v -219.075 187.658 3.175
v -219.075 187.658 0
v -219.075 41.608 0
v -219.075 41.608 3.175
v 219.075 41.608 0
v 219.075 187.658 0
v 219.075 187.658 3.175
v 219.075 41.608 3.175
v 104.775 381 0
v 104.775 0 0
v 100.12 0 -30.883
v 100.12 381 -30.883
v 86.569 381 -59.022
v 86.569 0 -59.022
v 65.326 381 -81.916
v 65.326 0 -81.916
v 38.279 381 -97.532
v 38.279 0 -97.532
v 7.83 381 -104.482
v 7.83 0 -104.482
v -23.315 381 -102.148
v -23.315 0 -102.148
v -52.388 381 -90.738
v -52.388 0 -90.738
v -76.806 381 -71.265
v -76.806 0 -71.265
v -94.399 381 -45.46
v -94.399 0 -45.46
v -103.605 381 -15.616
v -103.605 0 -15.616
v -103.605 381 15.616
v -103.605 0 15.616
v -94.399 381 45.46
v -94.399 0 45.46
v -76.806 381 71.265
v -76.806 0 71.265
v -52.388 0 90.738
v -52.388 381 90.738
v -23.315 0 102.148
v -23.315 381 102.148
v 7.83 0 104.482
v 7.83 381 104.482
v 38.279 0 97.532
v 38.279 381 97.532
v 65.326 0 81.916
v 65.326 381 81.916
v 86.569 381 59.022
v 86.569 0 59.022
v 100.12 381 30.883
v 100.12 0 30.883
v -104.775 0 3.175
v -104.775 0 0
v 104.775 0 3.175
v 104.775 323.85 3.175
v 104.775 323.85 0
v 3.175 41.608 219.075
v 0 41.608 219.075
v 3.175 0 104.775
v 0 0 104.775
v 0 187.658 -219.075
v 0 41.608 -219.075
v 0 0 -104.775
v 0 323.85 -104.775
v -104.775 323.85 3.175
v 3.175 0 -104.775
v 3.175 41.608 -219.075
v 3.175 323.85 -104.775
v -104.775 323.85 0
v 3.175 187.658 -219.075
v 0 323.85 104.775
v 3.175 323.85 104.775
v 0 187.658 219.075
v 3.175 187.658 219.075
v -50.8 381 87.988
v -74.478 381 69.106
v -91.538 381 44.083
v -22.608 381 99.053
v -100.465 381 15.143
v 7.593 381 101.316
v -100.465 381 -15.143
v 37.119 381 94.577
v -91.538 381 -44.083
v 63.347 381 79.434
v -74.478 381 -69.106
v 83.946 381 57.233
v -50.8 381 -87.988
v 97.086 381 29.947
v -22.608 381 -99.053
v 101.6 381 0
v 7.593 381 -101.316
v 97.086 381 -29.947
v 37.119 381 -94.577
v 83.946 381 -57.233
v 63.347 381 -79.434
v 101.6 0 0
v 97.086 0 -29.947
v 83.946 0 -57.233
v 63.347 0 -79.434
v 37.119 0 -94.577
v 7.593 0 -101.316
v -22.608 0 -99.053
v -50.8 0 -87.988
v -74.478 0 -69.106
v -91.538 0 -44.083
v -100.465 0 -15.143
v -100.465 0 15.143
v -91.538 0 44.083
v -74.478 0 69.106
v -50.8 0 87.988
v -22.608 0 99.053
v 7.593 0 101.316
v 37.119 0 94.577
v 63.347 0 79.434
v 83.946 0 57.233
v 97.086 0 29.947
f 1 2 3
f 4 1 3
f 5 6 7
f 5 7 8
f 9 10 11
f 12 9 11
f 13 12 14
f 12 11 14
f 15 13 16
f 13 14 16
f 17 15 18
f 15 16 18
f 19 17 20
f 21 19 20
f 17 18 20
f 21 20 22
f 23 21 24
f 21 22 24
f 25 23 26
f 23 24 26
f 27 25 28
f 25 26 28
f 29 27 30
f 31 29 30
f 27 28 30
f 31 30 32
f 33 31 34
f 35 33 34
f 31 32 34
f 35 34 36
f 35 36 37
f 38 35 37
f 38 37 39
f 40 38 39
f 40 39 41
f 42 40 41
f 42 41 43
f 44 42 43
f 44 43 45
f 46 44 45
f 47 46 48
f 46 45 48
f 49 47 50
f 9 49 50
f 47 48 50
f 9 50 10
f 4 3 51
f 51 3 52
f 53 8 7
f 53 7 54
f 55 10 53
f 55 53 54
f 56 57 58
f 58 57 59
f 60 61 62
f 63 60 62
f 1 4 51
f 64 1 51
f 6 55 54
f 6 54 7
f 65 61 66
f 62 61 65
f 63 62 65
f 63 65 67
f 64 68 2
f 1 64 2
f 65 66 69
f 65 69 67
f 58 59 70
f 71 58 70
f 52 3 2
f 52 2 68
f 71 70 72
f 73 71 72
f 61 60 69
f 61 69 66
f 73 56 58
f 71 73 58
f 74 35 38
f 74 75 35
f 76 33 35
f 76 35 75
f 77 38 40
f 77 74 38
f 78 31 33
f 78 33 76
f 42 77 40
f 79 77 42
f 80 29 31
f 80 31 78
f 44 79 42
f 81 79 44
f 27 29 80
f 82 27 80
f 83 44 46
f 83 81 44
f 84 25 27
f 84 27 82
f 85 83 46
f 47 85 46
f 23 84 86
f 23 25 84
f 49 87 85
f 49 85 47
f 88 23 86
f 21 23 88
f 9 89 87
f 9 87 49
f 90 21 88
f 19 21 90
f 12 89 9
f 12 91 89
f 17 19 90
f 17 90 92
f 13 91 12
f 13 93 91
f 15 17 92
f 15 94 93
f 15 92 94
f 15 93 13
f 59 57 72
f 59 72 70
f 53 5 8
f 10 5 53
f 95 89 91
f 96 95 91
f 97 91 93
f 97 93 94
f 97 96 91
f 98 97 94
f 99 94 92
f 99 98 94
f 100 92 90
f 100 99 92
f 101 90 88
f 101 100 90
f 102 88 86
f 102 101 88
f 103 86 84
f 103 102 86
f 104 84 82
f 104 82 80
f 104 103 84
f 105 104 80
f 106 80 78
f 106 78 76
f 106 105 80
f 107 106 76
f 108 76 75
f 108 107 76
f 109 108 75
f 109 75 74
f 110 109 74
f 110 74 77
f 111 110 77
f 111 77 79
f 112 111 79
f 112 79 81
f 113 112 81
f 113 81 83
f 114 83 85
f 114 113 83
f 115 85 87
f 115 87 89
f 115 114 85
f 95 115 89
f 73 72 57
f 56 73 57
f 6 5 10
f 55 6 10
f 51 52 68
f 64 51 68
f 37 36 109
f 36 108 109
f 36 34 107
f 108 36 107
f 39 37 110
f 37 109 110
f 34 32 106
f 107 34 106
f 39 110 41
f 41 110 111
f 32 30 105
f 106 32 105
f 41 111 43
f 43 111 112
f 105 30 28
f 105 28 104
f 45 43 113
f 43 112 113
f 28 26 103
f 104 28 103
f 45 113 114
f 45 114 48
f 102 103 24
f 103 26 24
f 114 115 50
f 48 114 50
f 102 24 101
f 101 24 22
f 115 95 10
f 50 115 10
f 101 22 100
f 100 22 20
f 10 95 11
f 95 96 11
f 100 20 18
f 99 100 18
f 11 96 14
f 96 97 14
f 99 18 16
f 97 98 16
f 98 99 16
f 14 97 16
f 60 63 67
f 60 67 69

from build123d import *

# Parameters (mm, degrees)
SKETCH1_R           = 104.775
SKETCH1_R_2         = 101.6
BOSS_EXTRUDE1_DEPTH = 381
BOSS_EXTRUDE2_DEPTH = 3.175
BOSS_EXTRUDE3_DEPTH = 3.175
BOSS_EXTRUDE4_DEPTH = 3.175
BOSS_EXTRUDE5_DEPTH = 3.175


with BuildPart() as part:
    # Sketch1 → Boss-Extrude1 (new body)
    with BuildSketch(Plane(origin=(0, 0, 0), x_dir=(1, 0, 0), z_dir=(0, 1, 0))):
        Circle(SKETCH1_R)
        Circle(SKETCH1_R_2, mode=Mode.SUBTRACT)
    extrude(amount=BOSS_EXTRUDE1_DEPTH)


with BuildPart() as body_2:
    # Sketch2 → Boss-Extrude2 (new body)
    with BuildSketch(Plane(origin=(0, 0, 0), x_dir=(0, 0, -1), z_dir=(1, 0, 0))):
        Polygon((-104.775, 323.85), (-219.075, 187.657672757), (-219.075, 41.607672757), (-104.775, 0), align=None)
    extrude(amount=BOSS_EXTRUDE2_DEPTH)


with BuildPart() as body_3:
    # Sketch5 → Boss-Extrude3 (new body)
    with BuildSketch(Plane(origin=(0, 0, 0), x_dir=(0, 0, -1), z_dir=(1, 0, 0))):
        Polygon((104.775, 323.85), (219.075, 187.657672757), (219.075, 41.607672757), (104.775, 0), align=None)
    extrude(amount=BOSS_EXTRUDE3_DEPTH)


with BuildPart() as body_4:
    # Sketch6 → Boss-Extrude4 (new body)
    with BuildSketch(Plane.XY):
        Polygon((-104.775, 323.85), (-219.075, 187.657672757), (-219.075, 41.607672757), (-104.775, 0), align=None)
    extrude(amount=BOSS_EXTRUDE4_DEPTH)


with BuildPart() as body_5:
    # Sketch7 → Boss-Extrude5 (new body)
    with BuildSketch(Plane.XY):
        Polygon((104.775, 323.85), (219.075, 187.657672757), (219.075, 41.607672757), (104.775, 0), align=None)
    extrude(amount=BOSS_EXTRUDE5_DEPTH)


solid = Compound([part.part, body_2.part, body_3.part, body_4.part, body_5.part])
